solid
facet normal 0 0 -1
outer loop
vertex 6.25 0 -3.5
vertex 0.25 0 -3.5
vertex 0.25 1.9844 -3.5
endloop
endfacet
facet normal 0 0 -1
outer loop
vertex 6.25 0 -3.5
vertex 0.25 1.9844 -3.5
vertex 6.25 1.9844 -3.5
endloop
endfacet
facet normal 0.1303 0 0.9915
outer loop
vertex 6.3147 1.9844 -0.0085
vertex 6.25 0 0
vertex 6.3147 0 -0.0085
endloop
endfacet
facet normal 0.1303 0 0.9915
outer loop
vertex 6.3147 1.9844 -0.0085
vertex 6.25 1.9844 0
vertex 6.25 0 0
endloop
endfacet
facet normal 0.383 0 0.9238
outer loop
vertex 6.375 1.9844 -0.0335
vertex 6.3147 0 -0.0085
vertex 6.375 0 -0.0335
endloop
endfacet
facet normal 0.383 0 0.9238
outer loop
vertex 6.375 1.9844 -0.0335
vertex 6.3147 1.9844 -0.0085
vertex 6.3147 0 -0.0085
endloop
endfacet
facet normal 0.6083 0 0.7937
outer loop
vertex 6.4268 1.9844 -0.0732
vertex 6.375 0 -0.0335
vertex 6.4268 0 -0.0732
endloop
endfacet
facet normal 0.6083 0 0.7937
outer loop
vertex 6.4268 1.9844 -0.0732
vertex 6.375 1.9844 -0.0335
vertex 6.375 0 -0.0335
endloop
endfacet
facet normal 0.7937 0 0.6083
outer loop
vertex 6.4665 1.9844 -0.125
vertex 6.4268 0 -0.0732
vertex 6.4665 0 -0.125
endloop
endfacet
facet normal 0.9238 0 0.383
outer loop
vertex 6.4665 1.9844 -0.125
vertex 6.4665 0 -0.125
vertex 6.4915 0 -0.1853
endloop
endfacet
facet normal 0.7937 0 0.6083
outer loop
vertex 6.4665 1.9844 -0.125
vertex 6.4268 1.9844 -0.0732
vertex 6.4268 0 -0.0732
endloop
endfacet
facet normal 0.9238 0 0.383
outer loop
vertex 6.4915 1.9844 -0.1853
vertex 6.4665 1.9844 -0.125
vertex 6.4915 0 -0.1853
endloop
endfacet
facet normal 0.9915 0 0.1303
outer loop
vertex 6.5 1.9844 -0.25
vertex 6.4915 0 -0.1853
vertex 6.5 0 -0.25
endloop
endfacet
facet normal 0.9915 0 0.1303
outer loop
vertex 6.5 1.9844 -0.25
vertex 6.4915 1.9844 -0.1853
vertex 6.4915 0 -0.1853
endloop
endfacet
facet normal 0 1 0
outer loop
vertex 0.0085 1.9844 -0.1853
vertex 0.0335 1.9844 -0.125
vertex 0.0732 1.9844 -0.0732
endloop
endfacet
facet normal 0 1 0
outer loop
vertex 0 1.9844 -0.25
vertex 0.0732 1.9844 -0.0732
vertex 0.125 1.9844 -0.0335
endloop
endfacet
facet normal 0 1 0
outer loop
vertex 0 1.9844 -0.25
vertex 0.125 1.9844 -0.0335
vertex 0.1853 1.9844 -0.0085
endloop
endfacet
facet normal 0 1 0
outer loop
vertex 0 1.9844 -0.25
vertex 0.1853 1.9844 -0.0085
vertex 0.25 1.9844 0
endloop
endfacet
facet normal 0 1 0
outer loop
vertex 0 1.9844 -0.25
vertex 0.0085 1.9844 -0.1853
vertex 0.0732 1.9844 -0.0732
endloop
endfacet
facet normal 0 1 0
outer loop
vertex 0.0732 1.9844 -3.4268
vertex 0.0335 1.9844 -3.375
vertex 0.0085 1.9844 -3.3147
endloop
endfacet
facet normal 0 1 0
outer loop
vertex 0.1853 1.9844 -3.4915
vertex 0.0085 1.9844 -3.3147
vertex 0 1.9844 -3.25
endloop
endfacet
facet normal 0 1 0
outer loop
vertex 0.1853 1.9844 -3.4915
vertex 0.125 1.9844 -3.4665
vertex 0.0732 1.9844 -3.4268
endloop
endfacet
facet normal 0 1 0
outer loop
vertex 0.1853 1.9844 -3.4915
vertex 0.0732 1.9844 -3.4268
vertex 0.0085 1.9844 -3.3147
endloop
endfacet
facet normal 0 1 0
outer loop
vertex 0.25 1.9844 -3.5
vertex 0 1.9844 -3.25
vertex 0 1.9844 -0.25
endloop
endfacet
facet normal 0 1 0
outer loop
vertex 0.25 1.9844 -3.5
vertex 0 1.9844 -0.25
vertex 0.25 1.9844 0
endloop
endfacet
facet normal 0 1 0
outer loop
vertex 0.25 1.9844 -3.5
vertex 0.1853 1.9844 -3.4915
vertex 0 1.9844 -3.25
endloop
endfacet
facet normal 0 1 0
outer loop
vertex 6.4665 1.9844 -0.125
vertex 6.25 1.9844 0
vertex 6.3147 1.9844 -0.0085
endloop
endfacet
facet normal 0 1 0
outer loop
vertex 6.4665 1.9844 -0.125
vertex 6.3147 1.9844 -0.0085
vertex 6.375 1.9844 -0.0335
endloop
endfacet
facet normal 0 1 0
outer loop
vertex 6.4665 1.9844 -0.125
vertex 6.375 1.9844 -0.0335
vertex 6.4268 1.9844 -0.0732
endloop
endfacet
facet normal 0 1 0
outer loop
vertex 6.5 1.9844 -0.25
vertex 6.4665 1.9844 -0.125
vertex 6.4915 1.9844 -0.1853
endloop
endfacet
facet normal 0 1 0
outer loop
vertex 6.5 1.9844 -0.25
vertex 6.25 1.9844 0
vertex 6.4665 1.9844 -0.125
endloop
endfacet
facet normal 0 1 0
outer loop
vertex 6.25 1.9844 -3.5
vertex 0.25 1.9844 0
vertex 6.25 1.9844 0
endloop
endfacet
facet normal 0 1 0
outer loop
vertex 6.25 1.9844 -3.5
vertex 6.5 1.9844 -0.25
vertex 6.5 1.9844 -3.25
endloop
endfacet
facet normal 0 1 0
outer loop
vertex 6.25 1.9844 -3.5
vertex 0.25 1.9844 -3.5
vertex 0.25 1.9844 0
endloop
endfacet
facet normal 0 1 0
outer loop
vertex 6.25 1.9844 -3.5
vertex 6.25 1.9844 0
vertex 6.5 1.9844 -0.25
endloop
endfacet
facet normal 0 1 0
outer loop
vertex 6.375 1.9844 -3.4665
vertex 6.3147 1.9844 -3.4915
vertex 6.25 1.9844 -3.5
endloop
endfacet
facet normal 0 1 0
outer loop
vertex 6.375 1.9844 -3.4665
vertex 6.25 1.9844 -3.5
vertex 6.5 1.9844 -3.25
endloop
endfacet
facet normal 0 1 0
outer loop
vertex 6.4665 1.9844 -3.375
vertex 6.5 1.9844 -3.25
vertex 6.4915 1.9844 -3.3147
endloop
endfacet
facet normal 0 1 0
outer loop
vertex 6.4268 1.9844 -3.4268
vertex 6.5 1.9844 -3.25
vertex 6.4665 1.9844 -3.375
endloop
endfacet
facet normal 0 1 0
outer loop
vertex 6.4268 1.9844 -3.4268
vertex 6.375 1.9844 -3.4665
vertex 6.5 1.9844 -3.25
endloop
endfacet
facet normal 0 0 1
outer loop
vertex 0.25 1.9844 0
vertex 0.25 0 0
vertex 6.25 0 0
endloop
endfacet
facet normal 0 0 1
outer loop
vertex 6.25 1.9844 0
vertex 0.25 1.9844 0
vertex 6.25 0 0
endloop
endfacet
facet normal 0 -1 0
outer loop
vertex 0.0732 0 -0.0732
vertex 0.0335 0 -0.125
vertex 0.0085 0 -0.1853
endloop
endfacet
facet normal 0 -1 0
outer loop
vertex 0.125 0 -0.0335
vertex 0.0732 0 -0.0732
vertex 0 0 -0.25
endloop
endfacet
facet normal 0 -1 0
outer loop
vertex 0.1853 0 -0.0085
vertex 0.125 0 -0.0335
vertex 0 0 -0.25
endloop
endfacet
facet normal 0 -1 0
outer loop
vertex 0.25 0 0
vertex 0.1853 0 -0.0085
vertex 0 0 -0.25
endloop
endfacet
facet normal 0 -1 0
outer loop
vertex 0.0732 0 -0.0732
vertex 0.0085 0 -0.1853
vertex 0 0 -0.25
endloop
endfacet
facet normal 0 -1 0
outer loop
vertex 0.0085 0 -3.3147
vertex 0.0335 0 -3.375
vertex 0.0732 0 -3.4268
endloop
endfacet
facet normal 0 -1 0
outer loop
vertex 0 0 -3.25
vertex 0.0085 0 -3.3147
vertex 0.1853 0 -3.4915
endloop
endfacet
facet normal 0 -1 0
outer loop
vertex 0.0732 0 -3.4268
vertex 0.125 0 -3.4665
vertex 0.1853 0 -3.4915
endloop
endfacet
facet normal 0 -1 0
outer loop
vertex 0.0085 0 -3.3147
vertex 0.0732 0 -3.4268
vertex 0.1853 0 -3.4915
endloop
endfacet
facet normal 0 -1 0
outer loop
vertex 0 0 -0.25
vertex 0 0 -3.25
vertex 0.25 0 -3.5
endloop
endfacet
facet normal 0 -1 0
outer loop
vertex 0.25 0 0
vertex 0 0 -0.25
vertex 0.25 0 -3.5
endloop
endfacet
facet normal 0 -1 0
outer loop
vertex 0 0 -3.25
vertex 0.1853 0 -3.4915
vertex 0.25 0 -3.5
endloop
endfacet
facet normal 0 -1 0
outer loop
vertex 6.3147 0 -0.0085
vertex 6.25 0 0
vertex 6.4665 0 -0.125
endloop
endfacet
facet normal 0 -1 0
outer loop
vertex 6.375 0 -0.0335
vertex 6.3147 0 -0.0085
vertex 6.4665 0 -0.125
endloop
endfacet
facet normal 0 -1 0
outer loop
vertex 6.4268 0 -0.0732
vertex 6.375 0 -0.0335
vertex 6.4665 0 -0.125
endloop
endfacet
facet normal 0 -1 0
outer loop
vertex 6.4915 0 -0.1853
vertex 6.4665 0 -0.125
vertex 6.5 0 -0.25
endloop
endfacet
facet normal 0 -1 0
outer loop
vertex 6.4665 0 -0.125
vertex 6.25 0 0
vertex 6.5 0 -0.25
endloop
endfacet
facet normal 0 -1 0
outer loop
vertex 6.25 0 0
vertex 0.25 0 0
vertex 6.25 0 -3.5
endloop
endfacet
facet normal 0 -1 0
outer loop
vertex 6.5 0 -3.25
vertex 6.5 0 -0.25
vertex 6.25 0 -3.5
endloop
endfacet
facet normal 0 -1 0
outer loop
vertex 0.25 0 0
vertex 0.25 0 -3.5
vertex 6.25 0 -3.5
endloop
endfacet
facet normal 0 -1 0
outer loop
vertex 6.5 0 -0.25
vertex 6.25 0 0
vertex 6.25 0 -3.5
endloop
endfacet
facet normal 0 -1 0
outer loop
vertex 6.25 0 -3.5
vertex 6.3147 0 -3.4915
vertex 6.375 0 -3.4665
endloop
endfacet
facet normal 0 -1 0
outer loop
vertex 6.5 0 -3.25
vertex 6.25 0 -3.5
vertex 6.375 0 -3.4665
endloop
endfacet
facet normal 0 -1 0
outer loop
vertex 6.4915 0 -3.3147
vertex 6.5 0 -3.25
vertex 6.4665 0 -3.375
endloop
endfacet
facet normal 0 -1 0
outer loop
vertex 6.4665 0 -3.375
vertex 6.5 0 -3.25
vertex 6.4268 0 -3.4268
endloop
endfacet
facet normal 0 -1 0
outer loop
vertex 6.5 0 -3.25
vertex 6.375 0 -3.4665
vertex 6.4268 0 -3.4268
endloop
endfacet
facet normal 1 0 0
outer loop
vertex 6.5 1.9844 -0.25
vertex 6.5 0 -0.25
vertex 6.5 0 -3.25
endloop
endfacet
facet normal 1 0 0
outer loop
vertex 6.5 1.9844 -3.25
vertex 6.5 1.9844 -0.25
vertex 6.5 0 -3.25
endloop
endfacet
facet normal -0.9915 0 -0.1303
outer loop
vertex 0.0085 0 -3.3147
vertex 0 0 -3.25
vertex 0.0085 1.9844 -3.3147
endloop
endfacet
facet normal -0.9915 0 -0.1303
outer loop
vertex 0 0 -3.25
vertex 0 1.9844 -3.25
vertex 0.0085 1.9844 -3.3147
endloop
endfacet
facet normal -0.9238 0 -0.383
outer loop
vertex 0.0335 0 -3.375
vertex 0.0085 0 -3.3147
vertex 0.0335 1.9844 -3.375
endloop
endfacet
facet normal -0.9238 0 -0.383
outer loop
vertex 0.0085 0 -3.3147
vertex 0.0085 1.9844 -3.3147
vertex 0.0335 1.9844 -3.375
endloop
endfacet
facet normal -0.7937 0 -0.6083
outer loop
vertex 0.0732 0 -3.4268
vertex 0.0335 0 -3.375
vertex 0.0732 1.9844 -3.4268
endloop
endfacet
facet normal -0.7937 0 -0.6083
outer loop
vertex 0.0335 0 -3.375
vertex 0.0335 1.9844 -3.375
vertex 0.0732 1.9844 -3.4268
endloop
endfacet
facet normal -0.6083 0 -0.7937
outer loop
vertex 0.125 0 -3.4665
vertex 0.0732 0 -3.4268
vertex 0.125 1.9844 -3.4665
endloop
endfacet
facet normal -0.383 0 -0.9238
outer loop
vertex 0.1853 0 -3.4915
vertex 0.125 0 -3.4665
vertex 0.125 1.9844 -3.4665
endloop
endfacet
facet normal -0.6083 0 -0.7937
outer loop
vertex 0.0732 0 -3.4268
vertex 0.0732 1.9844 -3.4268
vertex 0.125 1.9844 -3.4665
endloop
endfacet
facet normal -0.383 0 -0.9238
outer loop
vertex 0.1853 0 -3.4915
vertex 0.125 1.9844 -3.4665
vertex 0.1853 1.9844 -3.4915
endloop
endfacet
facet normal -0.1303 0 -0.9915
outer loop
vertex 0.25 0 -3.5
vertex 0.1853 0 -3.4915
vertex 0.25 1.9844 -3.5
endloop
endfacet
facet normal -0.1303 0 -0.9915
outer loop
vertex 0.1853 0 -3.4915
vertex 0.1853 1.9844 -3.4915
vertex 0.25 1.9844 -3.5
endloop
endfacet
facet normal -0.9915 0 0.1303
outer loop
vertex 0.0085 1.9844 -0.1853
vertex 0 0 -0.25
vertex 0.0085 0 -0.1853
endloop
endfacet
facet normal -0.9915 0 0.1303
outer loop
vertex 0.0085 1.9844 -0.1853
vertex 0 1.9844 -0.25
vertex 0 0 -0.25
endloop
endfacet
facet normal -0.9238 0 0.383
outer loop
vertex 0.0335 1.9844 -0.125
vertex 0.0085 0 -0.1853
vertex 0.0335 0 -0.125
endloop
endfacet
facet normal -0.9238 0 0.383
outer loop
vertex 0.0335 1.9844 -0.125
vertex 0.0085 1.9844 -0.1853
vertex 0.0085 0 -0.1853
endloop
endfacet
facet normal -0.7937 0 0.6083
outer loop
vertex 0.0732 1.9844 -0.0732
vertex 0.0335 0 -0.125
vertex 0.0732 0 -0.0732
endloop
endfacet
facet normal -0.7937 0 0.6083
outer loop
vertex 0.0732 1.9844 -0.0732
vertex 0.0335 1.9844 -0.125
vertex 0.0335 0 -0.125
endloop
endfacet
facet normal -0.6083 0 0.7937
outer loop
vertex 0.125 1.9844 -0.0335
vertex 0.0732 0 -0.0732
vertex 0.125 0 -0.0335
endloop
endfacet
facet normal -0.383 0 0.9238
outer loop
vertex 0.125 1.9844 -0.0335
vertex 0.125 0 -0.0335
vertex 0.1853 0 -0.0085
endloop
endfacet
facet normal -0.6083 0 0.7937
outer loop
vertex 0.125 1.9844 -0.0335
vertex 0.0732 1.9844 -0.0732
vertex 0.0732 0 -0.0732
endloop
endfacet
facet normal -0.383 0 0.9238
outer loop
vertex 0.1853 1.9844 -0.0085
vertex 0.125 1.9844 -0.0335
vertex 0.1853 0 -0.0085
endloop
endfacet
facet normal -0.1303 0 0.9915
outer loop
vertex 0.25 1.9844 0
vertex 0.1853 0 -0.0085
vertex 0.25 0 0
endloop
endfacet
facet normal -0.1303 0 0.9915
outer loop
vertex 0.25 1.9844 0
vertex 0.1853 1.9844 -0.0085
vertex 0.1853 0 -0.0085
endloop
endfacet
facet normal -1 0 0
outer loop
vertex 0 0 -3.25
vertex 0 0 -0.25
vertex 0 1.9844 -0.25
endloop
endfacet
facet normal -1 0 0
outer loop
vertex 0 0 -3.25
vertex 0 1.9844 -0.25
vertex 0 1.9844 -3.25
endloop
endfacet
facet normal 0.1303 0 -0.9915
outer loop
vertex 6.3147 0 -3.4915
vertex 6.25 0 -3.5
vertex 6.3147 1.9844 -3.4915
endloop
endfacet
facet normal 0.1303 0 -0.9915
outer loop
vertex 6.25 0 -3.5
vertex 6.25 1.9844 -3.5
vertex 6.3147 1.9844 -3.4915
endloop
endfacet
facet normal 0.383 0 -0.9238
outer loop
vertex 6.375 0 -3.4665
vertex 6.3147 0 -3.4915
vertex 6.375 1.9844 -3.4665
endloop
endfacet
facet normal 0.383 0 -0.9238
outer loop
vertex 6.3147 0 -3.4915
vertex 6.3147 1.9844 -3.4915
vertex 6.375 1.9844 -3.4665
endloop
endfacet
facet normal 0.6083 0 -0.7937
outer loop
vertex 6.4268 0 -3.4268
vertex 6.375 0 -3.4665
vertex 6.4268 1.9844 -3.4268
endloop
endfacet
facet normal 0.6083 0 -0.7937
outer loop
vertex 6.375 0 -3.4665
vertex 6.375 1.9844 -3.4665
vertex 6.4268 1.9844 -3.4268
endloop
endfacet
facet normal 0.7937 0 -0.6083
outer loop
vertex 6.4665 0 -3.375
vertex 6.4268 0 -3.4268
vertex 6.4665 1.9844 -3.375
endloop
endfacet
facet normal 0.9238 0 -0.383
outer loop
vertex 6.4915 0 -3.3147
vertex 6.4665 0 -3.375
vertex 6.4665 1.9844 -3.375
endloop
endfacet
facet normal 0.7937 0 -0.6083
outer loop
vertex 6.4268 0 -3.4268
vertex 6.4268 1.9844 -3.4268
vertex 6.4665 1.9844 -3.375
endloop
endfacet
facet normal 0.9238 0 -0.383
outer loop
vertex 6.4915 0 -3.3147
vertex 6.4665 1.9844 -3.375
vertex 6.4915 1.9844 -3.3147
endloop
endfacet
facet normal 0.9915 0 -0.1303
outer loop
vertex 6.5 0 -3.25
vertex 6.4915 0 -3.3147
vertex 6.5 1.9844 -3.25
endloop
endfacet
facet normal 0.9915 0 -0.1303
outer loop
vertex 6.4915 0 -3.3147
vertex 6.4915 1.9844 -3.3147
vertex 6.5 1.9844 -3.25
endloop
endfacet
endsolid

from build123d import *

# Parameters (mm, degrees)
SKETCH1_W           = 6.5
SKETCH1_H           = 3.5
BOSS_EXTRUDE1_DEPTH = 1.984375
FILLET1_R           = 0.25
FILLET2_R           = 0.25


with BuildPart() as part:
    # Sketch1 → Boss-Extrude1 (new body)
    with BuildSketch(Plane(origin=(0, 0, 0), x_dir=(1, 0, 0), z_dir=(0, 1, 0))):
        with Locations((3.25, 1.75)):
            Rectangle(SKETCH1_W, SKETCH1_H)
    extrude(amount=BOSS_EXTRUDE1_DEPTH)

    # Fillet1
    fillet1_edges = [part.edges().sort_by_distance(p)[0] for p in [
        (6.5, 0.9921875, 0),
        (0, 0.9921875, 0),
    ]]
    fillet(fillet1_edges, radius=FILLET1_R)

    # Fillet2
    fillet2_edges = [part.edges().sort_by_distance(p)[0] for p in [
        (0, 0.9921875, -3.5),
        (6.5, 0.9921875, -3.5),
    ]]
    fillet(fillet2_edges, radius=FILLET2_R)


solid = part.part
